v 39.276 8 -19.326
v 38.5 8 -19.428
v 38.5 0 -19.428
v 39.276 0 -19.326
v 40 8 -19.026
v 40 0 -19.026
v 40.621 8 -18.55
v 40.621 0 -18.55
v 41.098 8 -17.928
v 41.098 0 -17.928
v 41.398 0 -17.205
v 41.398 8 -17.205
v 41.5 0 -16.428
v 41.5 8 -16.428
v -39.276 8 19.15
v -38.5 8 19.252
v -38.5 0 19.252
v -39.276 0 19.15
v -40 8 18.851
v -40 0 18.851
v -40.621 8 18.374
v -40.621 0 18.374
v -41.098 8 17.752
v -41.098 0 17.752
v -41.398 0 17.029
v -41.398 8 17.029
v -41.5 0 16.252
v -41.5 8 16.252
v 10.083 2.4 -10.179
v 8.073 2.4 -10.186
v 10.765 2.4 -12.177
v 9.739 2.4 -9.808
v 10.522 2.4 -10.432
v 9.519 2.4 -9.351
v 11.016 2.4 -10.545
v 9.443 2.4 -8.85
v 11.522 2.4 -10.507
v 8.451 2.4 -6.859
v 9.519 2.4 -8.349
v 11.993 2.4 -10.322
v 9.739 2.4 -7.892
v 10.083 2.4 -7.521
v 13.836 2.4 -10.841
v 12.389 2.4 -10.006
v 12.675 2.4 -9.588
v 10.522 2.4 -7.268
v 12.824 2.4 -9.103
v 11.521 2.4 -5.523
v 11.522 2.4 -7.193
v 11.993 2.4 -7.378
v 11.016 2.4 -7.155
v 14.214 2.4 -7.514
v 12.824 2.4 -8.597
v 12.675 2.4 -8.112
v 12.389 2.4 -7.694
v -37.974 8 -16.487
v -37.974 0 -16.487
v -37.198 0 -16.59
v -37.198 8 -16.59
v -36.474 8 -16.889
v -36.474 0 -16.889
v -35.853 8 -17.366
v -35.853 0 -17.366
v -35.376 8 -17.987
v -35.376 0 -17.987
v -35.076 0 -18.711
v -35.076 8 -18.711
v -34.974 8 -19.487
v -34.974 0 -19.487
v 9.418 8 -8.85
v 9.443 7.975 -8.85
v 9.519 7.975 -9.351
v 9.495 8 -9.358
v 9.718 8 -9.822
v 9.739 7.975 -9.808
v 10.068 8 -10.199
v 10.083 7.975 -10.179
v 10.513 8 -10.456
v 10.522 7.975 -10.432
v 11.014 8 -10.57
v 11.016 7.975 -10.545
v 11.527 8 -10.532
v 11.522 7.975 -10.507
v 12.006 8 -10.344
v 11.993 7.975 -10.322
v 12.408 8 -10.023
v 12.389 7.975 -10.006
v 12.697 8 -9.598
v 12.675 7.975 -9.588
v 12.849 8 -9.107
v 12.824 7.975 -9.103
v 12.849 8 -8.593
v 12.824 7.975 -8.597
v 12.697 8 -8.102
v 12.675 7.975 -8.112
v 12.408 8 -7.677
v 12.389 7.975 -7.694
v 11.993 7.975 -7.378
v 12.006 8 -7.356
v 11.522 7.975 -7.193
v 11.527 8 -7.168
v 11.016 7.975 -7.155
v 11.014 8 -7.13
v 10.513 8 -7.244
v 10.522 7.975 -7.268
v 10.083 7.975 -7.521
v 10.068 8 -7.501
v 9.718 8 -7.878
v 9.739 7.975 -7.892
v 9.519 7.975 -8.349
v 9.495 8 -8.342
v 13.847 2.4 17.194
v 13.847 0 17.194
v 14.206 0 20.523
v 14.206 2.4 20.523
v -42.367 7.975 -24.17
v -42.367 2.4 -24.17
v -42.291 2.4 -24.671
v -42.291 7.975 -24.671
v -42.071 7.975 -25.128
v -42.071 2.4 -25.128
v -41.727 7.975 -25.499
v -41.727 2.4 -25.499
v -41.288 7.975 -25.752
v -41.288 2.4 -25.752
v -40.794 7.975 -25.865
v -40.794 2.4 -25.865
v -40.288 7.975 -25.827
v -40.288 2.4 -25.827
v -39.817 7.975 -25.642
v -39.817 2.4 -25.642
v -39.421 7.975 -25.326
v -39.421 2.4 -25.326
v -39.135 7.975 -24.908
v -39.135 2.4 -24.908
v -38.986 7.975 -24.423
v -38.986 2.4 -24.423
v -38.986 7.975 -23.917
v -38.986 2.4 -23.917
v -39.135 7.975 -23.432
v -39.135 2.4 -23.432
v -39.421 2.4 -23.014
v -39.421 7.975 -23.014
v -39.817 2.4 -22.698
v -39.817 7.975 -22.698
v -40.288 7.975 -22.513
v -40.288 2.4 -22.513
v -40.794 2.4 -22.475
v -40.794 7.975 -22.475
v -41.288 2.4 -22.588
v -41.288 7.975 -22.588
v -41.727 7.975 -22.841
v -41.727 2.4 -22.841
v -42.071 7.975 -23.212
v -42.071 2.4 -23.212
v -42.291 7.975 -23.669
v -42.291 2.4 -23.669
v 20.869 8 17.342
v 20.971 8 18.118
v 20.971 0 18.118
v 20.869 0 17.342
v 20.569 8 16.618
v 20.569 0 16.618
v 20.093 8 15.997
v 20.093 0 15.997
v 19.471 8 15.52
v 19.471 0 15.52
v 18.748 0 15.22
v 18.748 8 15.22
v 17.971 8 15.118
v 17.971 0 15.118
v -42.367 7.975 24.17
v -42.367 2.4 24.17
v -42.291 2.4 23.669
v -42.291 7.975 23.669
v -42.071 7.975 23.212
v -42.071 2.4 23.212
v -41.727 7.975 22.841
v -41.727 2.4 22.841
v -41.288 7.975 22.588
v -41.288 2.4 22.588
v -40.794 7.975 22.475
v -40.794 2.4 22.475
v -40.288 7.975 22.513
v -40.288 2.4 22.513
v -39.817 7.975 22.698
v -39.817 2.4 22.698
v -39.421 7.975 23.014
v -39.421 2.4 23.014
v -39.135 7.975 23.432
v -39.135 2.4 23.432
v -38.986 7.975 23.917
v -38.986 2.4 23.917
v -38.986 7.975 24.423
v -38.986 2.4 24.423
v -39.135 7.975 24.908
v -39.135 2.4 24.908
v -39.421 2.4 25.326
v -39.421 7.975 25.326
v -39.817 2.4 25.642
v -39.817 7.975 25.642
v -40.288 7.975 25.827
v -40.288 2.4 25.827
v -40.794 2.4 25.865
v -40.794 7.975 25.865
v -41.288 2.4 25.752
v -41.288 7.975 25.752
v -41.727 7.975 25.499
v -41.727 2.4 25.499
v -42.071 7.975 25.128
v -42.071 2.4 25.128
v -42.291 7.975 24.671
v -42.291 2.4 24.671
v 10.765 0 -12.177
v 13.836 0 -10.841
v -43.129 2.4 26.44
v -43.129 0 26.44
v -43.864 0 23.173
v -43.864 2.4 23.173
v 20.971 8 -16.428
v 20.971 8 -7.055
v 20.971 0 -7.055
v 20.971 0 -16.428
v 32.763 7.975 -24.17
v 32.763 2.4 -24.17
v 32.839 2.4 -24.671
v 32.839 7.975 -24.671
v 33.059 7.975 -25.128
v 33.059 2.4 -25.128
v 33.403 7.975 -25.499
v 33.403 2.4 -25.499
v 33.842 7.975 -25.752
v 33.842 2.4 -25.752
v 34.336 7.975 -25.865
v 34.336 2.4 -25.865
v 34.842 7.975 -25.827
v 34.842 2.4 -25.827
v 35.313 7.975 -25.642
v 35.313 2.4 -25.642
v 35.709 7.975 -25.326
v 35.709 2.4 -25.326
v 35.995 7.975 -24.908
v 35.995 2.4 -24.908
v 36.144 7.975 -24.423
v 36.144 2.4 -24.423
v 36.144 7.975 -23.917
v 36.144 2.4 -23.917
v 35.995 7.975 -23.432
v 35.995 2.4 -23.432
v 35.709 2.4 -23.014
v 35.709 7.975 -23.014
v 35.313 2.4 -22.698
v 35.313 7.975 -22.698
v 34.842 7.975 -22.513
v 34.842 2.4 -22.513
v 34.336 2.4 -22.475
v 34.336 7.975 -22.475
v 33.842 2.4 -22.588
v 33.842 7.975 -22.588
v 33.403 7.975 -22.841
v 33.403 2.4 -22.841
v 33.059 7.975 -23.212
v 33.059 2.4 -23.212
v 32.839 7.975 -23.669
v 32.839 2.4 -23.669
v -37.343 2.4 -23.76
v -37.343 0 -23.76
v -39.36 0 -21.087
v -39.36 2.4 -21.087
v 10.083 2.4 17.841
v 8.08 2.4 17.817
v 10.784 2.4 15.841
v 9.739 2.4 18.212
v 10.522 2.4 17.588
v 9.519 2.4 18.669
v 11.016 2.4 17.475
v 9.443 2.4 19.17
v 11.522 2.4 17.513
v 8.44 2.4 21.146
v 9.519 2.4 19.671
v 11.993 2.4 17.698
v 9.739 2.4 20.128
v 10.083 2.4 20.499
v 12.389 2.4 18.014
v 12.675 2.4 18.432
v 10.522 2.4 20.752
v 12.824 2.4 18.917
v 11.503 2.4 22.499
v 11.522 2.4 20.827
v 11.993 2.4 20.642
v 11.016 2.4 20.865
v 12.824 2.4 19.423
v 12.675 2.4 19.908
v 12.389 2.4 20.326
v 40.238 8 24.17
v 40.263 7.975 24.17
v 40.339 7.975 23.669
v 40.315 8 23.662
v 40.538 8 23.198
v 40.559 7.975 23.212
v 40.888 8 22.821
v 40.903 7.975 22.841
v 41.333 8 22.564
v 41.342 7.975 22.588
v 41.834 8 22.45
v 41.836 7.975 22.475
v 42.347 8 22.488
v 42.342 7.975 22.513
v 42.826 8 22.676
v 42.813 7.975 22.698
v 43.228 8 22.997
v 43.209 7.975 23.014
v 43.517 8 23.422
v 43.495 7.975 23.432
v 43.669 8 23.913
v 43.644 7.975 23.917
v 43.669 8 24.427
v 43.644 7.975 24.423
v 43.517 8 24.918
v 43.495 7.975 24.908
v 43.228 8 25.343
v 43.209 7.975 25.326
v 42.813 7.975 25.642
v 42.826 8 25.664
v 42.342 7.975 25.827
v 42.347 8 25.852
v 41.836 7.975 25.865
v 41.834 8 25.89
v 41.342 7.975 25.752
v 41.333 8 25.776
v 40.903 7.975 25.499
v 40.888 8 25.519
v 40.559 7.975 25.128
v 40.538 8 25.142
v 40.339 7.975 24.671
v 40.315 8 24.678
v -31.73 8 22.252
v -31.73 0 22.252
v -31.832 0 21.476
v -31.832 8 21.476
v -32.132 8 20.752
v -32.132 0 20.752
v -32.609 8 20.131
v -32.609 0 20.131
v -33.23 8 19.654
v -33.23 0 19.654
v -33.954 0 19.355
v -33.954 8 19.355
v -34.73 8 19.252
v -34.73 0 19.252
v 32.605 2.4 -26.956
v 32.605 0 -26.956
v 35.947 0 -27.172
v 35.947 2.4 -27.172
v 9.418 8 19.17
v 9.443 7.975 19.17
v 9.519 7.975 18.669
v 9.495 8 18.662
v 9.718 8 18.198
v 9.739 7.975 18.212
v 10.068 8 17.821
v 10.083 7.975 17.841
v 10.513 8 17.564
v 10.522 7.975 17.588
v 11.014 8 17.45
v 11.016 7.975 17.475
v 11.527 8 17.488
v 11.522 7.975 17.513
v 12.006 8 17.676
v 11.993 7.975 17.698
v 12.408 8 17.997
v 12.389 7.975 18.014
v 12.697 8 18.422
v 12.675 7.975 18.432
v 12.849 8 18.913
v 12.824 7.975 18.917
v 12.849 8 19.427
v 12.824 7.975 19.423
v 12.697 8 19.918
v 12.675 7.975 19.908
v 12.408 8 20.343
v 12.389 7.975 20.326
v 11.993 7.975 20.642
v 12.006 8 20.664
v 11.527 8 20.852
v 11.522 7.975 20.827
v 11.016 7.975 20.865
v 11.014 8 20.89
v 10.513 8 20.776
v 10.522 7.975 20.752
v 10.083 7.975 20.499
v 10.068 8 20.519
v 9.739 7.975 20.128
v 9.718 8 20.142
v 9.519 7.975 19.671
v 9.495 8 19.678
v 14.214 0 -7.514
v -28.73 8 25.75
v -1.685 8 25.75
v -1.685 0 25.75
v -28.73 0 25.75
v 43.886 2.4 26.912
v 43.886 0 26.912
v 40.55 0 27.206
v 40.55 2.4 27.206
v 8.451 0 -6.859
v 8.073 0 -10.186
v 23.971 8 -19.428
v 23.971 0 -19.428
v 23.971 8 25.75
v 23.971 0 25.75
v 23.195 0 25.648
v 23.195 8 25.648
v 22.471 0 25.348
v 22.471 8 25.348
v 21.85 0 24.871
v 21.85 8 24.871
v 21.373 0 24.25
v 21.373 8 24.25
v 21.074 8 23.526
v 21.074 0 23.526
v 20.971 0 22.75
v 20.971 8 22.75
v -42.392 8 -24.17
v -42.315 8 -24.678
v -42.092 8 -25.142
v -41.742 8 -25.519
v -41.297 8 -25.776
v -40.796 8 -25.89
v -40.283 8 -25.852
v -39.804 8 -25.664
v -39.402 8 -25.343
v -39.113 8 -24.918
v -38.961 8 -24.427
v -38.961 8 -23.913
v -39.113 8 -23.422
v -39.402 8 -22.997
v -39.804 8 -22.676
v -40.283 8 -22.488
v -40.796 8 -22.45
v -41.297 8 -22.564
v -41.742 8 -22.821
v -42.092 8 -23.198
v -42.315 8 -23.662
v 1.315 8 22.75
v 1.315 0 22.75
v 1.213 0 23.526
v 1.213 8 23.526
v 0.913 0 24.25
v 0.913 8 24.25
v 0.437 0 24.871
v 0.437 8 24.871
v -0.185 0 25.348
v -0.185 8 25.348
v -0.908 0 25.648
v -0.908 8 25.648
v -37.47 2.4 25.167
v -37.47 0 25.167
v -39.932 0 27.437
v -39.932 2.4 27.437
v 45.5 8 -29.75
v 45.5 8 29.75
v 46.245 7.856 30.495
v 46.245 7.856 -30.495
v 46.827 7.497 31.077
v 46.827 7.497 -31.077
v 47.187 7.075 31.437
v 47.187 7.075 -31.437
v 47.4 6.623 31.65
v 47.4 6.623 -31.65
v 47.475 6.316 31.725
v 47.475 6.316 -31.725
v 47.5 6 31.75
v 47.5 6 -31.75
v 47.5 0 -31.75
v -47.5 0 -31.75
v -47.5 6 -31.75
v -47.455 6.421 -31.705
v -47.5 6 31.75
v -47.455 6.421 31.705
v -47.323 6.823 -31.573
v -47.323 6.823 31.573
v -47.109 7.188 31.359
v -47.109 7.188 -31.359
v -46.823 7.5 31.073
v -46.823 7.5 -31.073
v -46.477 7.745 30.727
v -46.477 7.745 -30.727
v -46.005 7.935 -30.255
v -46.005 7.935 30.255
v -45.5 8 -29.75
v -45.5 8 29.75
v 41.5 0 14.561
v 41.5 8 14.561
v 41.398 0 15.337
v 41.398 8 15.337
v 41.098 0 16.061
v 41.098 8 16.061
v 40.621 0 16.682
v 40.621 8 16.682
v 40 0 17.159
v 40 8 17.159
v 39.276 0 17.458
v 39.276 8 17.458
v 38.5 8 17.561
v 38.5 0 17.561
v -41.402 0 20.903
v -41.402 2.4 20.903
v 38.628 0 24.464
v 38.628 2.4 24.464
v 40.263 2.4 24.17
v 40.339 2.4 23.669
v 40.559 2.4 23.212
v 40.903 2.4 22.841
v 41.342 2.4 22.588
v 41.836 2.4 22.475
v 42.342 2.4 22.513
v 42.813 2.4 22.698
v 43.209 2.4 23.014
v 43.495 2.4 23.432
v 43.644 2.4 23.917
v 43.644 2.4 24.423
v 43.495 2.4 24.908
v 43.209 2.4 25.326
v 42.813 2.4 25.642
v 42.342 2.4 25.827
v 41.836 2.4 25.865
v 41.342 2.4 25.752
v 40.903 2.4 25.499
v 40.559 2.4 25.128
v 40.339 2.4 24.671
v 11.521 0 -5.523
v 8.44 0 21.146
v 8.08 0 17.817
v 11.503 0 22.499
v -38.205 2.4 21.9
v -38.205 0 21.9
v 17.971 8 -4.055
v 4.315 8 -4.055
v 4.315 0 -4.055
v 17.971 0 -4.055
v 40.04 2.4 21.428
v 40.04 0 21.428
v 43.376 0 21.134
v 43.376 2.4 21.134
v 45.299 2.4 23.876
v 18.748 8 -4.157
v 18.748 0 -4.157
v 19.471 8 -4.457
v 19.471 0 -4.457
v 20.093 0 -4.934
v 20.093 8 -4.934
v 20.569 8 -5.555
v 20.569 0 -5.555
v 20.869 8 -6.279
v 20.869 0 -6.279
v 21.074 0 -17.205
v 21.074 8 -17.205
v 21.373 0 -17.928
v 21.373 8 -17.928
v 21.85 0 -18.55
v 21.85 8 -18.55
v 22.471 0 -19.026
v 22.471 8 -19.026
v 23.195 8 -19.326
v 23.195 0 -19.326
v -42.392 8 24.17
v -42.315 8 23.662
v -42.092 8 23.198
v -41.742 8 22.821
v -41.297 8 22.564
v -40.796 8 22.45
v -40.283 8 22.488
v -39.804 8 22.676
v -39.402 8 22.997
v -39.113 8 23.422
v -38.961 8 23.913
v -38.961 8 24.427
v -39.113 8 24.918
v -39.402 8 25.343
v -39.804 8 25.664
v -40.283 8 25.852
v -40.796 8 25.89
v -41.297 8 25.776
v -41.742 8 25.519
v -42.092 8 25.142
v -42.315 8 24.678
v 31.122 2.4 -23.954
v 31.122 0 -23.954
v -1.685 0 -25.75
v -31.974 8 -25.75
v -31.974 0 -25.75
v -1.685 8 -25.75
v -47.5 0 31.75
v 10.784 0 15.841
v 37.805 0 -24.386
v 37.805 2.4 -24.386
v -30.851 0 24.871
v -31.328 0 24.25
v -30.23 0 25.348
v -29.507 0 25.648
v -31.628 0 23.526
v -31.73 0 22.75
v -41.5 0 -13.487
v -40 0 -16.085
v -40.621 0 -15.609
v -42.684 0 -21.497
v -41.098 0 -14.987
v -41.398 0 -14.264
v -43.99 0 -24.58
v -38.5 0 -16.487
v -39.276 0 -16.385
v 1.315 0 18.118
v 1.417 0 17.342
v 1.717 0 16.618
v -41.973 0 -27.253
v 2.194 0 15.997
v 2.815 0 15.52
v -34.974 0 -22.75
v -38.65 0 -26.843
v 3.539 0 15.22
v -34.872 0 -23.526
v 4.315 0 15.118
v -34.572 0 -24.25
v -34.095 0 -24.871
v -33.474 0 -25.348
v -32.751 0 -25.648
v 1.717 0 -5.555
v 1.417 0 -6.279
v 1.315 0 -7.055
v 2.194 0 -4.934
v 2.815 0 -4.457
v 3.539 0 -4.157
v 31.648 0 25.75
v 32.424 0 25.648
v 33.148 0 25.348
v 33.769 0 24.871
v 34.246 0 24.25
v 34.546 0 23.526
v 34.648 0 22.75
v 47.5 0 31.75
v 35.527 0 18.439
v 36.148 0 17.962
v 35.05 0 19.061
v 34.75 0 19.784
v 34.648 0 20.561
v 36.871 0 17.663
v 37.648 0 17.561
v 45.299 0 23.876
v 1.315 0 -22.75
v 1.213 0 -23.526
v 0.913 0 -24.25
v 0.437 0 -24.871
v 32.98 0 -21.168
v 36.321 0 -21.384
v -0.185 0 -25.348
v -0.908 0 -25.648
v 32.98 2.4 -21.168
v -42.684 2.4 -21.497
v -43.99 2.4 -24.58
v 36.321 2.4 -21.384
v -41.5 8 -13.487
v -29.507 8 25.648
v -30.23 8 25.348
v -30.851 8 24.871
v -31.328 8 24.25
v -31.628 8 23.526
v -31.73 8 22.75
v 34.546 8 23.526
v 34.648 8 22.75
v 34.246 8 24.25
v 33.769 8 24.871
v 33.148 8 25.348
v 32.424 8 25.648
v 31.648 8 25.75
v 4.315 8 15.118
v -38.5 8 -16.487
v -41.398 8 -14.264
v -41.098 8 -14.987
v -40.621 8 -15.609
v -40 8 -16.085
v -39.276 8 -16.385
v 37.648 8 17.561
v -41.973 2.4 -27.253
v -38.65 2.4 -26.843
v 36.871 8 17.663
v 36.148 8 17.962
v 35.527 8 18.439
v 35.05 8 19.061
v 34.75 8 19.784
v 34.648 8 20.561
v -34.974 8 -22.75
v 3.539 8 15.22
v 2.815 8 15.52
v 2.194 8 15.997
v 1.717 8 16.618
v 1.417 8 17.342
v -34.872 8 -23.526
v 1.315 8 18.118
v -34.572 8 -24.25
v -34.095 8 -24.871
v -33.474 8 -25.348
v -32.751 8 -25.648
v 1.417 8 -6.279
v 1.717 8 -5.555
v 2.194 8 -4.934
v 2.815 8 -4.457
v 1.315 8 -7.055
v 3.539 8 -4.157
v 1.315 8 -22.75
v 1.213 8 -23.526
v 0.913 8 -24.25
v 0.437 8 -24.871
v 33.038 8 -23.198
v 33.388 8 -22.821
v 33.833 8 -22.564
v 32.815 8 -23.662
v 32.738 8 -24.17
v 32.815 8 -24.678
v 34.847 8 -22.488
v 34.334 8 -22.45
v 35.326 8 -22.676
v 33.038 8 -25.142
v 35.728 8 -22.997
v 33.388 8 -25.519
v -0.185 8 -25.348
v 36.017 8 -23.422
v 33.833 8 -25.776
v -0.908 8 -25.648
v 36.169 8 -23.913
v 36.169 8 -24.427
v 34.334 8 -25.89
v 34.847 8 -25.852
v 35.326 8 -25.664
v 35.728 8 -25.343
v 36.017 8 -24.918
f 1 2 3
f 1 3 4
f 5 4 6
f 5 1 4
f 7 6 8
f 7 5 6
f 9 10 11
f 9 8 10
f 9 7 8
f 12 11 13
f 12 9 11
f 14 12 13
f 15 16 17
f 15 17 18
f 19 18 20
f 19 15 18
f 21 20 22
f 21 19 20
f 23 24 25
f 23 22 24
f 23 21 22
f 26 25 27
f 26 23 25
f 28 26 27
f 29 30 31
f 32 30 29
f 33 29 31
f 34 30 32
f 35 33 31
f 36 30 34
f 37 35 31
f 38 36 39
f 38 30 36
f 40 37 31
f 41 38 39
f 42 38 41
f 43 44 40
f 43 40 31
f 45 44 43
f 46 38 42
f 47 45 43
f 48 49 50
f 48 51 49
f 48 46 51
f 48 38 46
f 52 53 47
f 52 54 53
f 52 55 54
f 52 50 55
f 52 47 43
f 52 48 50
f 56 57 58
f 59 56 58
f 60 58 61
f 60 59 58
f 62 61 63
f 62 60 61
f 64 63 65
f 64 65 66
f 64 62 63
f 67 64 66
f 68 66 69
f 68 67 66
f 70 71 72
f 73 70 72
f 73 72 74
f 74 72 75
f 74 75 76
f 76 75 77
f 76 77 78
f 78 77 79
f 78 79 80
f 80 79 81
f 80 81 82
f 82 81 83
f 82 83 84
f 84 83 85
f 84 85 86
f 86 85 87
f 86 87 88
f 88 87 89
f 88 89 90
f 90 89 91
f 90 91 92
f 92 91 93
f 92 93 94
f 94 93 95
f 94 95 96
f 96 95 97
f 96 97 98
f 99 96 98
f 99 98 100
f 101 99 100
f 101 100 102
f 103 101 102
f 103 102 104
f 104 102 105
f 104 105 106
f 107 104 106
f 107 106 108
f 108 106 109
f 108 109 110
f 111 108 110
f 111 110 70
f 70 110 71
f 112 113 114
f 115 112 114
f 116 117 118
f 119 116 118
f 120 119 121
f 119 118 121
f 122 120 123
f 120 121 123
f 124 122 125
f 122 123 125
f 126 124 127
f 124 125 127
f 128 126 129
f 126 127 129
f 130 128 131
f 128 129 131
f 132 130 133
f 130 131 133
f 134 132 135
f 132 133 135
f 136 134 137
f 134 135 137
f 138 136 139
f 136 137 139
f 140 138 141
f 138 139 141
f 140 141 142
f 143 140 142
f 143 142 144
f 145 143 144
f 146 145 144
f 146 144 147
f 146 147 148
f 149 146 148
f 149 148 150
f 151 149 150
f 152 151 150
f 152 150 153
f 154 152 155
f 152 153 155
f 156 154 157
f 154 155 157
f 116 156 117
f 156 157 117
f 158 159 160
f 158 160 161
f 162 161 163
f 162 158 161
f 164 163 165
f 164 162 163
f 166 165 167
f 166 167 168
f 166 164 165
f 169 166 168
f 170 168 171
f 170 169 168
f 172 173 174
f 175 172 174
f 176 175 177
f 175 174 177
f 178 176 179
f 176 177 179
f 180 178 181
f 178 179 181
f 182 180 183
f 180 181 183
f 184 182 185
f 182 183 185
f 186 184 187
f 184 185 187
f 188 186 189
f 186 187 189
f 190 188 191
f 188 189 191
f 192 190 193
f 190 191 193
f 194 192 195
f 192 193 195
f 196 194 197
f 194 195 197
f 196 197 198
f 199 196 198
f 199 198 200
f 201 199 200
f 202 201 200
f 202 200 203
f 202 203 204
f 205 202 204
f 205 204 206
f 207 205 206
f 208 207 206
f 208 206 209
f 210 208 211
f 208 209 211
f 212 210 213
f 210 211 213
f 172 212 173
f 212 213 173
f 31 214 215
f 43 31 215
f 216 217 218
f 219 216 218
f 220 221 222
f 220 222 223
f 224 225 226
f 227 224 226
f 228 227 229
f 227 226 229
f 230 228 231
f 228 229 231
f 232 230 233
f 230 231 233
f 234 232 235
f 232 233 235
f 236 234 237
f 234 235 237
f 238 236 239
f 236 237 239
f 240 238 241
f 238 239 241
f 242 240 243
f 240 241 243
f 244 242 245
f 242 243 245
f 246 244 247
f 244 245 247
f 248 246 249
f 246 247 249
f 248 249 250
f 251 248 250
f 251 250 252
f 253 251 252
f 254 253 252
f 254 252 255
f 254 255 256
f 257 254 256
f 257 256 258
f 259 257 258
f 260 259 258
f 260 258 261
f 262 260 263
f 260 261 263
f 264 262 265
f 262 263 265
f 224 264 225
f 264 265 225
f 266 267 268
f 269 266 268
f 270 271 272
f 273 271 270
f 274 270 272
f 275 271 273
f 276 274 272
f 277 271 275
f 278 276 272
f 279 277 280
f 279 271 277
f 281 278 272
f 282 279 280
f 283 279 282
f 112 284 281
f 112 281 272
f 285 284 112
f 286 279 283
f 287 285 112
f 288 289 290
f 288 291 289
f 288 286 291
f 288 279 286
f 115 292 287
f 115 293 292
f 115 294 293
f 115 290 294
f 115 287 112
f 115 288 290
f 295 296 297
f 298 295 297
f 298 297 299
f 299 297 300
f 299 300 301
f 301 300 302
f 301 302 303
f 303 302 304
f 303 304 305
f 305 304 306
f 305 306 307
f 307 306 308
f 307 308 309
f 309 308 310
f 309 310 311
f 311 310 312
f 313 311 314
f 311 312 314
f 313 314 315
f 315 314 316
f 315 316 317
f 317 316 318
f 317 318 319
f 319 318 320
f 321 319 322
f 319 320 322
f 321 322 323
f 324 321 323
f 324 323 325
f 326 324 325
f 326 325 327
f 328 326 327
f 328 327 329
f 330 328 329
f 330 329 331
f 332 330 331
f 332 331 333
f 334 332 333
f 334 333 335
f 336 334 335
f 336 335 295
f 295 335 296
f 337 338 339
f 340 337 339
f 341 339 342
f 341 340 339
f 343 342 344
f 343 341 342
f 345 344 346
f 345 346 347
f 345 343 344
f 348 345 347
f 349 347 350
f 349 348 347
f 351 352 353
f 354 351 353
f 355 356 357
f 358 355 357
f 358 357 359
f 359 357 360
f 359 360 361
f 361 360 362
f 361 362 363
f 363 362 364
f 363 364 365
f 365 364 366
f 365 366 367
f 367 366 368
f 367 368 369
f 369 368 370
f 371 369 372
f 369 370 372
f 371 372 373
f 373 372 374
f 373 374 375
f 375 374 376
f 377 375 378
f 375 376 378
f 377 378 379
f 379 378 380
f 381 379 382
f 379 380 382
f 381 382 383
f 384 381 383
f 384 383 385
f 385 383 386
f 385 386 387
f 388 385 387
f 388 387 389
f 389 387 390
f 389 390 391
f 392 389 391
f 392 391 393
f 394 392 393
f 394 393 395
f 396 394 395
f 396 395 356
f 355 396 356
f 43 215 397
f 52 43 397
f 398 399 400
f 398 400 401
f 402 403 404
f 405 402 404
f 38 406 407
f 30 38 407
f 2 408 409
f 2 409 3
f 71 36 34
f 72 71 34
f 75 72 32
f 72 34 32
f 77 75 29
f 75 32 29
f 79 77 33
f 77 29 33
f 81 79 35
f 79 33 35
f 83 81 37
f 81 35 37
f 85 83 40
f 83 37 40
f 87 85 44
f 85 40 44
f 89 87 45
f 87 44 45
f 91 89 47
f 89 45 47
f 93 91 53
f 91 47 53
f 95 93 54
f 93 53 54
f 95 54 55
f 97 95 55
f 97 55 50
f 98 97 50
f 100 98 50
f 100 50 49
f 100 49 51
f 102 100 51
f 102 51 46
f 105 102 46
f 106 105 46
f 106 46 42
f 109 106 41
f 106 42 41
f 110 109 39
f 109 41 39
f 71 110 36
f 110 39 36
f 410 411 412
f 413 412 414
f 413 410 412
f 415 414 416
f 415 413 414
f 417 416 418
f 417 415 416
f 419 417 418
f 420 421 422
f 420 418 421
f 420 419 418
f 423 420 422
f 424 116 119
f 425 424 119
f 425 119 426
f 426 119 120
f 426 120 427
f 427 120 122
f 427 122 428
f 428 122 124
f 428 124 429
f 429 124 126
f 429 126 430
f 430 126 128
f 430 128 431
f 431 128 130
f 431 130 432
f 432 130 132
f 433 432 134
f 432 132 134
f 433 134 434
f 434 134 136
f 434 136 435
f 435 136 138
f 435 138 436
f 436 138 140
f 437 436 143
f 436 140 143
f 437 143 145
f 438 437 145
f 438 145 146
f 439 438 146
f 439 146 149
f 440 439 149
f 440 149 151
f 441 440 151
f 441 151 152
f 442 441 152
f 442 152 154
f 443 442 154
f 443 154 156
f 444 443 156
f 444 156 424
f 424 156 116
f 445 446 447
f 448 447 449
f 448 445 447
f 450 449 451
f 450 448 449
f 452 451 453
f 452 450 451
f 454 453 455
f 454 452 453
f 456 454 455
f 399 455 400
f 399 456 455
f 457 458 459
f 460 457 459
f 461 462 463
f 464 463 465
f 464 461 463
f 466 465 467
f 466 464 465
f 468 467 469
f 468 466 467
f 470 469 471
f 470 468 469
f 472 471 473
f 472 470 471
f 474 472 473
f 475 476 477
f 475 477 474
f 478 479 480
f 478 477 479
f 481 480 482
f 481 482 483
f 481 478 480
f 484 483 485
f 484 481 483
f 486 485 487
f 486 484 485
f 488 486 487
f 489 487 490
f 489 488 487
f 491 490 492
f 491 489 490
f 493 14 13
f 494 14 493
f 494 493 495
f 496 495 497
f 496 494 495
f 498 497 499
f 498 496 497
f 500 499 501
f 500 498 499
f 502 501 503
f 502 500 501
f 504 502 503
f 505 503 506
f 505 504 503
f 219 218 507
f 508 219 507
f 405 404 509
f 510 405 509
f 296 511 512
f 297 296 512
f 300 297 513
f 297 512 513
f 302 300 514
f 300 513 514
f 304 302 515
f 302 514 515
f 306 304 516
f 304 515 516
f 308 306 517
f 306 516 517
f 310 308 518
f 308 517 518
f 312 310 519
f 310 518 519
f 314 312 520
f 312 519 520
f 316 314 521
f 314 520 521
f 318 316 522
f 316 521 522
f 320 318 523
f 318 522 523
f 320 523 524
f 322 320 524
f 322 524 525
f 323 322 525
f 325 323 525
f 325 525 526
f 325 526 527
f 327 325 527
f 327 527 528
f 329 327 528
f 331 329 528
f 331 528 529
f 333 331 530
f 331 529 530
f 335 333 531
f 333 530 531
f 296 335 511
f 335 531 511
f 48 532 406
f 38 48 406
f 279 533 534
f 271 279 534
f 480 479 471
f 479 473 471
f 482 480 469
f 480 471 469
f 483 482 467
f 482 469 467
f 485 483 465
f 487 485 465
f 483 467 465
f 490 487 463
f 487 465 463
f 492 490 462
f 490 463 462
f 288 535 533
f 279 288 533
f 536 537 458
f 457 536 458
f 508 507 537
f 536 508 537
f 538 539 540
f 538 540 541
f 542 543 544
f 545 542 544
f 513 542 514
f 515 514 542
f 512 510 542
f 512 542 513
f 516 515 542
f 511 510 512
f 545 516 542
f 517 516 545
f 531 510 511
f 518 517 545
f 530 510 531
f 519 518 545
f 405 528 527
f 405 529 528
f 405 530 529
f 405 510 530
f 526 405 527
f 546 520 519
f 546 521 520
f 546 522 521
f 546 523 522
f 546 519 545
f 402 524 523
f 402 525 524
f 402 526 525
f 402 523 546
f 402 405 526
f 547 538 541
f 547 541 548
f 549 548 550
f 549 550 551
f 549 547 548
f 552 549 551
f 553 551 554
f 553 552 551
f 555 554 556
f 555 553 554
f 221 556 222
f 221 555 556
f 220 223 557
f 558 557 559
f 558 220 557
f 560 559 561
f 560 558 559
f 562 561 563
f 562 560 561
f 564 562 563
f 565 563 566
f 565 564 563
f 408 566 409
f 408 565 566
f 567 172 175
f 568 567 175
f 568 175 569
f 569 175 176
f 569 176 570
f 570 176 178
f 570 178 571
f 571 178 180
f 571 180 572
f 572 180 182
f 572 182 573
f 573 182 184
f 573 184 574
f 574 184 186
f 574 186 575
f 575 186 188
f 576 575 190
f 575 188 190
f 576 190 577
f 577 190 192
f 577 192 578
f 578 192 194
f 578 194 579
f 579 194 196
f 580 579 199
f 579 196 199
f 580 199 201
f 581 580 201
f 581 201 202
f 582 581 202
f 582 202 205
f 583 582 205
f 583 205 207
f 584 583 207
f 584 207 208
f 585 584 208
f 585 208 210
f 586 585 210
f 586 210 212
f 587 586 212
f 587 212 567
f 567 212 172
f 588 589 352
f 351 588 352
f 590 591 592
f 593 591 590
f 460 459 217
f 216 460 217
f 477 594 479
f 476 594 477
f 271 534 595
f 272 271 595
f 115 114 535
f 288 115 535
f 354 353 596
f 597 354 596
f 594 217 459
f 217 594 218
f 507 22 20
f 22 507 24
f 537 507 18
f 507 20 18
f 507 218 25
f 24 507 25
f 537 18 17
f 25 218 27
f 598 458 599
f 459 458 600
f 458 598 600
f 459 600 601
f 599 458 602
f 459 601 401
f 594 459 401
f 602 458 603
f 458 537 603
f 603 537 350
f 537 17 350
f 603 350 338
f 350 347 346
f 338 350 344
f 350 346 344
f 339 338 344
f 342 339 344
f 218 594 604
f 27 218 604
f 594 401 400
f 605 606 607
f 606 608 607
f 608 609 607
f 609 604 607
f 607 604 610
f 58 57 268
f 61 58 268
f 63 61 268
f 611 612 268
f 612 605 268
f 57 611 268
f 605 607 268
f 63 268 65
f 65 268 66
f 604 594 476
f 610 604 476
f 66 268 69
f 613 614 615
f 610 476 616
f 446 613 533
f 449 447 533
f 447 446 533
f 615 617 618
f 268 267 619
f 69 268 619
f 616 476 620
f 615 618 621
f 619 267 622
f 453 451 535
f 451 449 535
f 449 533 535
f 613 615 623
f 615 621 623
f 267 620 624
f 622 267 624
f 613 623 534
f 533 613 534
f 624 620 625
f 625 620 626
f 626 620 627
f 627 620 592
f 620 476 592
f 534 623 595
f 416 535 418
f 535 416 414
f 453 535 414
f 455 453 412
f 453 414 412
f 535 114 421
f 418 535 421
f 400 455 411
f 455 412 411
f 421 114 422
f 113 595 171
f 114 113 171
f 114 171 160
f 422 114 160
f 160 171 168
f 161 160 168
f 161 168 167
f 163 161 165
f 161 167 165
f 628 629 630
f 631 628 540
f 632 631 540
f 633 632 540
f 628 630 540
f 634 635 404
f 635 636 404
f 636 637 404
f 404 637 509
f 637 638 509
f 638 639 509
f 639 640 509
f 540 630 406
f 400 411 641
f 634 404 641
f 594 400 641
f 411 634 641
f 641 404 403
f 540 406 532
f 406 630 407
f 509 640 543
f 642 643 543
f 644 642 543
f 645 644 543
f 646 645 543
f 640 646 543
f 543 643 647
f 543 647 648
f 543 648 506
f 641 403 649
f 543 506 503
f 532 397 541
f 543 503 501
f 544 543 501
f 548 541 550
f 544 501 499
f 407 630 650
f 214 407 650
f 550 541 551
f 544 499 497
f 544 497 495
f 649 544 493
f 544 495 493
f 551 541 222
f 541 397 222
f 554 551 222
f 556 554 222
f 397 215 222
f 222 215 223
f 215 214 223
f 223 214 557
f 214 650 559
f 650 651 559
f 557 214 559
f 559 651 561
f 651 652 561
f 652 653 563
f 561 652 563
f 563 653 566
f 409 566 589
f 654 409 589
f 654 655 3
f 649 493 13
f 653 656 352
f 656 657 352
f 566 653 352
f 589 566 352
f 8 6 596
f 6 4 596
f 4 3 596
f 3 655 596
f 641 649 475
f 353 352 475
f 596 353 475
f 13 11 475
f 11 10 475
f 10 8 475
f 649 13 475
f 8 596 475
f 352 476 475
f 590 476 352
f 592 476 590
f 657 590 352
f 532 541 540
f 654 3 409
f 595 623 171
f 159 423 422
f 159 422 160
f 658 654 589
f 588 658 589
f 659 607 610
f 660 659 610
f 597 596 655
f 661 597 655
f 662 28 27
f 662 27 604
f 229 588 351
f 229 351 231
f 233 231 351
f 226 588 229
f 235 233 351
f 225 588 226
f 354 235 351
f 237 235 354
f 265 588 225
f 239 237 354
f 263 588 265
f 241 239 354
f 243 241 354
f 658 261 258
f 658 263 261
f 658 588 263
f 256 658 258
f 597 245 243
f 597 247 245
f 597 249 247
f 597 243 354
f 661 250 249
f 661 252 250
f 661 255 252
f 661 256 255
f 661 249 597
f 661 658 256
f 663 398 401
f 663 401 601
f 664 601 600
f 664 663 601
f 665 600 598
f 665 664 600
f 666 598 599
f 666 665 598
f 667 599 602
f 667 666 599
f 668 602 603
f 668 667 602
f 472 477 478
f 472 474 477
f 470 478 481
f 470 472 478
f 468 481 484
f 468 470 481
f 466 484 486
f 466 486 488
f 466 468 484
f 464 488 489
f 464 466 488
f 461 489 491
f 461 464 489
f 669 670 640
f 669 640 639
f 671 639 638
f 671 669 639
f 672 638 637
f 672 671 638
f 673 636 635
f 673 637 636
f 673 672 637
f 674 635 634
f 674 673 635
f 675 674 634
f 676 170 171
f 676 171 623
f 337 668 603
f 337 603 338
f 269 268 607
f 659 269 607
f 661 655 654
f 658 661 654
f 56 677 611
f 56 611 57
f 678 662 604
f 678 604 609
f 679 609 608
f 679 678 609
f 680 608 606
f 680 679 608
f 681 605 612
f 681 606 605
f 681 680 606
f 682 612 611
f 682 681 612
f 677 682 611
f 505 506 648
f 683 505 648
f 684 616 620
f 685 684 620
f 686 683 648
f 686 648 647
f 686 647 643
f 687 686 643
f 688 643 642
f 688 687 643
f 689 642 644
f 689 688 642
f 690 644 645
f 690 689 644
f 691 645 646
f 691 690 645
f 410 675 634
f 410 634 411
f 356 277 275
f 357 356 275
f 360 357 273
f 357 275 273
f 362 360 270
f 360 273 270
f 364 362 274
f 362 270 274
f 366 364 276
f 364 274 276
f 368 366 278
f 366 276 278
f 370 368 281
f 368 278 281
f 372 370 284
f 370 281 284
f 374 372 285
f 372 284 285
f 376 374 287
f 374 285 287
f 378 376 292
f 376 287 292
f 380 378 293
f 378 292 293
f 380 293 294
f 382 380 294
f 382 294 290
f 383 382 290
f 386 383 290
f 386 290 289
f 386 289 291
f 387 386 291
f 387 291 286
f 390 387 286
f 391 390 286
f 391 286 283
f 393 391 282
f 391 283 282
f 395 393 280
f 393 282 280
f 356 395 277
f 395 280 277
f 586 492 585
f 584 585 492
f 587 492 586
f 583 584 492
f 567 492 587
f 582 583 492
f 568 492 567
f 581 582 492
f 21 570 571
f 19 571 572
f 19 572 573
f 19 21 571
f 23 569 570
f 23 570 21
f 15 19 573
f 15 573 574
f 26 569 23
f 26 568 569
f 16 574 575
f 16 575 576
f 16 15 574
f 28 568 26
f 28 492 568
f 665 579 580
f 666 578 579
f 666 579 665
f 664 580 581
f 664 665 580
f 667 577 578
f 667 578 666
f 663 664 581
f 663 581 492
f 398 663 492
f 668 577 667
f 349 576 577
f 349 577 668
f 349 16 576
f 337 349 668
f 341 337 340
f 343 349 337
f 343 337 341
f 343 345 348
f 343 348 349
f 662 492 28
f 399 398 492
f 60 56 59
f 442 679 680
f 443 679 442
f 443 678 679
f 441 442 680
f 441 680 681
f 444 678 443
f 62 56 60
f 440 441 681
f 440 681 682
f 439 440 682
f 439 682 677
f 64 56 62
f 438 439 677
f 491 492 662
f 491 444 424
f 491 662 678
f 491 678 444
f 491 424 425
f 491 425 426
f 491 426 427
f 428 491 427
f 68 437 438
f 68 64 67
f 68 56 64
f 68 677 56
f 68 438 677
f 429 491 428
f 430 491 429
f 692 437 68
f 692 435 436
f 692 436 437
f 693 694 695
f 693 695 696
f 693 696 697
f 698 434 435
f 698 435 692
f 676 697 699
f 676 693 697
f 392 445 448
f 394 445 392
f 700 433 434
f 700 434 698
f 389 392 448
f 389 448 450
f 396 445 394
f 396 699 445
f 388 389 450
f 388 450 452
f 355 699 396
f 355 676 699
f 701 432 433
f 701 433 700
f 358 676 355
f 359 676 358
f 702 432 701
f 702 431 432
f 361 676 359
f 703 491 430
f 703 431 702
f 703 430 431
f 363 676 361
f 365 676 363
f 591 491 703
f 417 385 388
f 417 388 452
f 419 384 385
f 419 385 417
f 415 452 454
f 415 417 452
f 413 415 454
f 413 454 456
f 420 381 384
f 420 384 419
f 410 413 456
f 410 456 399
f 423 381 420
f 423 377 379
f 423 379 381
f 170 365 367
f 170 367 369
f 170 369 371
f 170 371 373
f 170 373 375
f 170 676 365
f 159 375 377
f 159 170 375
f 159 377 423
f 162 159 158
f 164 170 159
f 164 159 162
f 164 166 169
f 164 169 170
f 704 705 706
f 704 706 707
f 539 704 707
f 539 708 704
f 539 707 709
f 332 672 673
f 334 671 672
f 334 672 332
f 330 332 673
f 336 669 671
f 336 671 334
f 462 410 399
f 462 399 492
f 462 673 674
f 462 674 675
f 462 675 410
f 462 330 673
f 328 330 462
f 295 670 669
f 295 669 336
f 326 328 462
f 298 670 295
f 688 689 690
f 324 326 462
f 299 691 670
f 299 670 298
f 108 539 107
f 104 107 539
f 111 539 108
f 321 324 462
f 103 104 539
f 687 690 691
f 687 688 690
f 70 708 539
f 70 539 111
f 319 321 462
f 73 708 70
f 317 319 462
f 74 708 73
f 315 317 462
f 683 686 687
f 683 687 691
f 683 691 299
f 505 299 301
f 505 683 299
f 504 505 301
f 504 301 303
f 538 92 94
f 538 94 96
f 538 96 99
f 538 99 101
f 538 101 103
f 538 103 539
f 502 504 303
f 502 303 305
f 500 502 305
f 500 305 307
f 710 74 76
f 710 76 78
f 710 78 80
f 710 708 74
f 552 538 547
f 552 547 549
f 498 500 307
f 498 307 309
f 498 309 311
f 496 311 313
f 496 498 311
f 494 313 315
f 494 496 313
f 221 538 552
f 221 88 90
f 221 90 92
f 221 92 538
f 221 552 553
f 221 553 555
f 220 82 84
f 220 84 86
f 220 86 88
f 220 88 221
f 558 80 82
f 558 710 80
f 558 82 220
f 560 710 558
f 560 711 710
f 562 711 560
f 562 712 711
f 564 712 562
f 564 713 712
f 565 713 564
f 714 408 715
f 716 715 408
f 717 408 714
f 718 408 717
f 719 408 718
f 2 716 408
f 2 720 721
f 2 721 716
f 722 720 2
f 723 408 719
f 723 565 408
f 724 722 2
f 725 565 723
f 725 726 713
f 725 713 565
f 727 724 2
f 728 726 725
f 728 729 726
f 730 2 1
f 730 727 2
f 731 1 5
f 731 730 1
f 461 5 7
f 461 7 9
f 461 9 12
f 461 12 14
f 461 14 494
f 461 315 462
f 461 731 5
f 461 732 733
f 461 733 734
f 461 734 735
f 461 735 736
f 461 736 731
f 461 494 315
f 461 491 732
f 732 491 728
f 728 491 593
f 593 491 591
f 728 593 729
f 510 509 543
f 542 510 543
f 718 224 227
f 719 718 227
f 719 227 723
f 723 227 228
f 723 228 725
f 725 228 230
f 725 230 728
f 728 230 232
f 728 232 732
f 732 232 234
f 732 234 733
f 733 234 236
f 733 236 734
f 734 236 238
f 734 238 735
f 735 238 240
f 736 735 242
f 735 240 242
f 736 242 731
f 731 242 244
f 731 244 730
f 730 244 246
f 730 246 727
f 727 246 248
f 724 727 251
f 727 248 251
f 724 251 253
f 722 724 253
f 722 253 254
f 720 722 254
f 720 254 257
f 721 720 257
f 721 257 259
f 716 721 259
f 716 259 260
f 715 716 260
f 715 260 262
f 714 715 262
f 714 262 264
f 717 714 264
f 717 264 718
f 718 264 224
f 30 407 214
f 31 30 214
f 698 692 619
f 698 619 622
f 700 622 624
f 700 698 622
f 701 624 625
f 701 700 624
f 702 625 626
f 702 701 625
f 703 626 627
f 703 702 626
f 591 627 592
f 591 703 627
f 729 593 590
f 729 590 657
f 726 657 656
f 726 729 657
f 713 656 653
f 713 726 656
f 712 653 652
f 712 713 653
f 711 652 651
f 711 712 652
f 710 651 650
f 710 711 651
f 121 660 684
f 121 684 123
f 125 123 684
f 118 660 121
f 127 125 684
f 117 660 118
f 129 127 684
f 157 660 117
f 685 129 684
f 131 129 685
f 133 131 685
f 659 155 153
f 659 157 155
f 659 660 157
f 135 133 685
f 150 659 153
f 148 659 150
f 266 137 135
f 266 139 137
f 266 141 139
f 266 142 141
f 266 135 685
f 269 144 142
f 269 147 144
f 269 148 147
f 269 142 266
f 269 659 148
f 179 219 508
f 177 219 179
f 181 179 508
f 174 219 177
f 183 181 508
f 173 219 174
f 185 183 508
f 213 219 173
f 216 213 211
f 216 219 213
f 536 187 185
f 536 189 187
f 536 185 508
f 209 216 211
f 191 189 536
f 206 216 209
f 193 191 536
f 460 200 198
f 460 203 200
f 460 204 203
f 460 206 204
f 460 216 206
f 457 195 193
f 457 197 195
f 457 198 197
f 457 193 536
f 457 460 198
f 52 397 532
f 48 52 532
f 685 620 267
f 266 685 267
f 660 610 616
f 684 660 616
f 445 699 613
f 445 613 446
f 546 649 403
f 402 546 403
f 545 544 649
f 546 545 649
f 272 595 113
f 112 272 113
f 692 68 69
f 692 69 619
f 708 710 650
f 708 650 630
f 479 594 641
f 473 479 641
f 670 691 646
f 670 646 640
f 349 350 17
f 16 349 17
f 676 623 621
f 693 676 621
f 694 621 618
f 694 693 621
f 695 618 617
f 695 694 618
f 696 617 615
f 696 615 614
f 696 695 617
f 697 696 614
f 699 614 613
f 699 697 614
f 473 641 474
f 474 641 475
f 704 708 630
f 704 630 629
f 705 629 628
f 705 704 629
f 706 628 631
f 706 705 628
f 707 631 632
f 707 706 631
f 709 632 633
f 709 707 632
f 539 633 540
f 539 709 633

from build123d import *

# Parameters (mm, degrees)
SKETCH2_W                      = 95
SKETCH2_H                      = 63.5
BOSS_EXTRUDE1_DEPTH            = 8
M3_CLEARANCE_HOLE1_D           = 3.4
M3_CLEARANCE_HOLE1_CSINK_D     = 3.45
M3_CLEARANCE_HOLE1_CSINK_ANGLE = 90
CUT_EXTRUDE1_DEPTH             = 10
CUT_EXTRUDE2_DEPTH             = 2.4
FILLET2_R                      = 2


with BuildPart() as part:
    # Sketch2 → Boss-Extrude1 (new body)
    with BuildSketch(Plane(origin=(0, 0, 0), x_dir=(1, 0, 0), z_dir=(0, 1, 0))):
        Rectangle(SKETCH2_W, SKETCH2_H)
    extrude(amount=BOSS_EXTRUDE1_DEPTH)

    # M3 Clearance Hole1 (through all)
    with Locations(Plane(origin=(0, 8, 0), x_dir=(1, 0, 0), z_dir=(0, 1, 0))):
        with Locations((-40.666732268, 24.17), (-40.666732268, -24.17), (34.463267732, 24.17), (41.963267732, -24.17), (11.143267732, -19.17), (11.143267732, 8.85)):
            CounterSinkHole(M3_CLEARANCE_HOLE1_D / 2, M3_CLEARANCE_HOLE1_CSINK_D / 2, counter_sink_angle=M3_CLEARANCE_HOLE1_CSINK_ANGLE)

    # Sketch9 → Cut-Extrude1 (cut)
    with BuildSketch(Plane(origin=(0, 8, 0), x_dir=(1, 0, 0), z_dir=(0, 1, 0))):
        with BuildLine():
            Line((-34.974163292, 19.487383717), (-34.974163292, 22.75))
            ThreePointArc((-34.974163292, 22.75), (-34.095483636, 24.871320344), (-31.974163292, 25.75))
            Line((-31.974163292, 25.75), (-1.684765082, 25.75))
            ThreePointArc((-1.684765082, 25.75), (0.436555262, 24.871320344), (1.315234918, 22.75))
            Line((1.315234918, 22.75), (1.315234918, 7.055031971))
            ThreePointArc((1.315234918, 7.055031971), (2.193914574, 4.933711628), (4.315234918, 4.055031971))
            Line((4.315234918, 4.055031971), (17.971300546, 4.055031971))
            ThreePointArc((17.971300546, 4.055031971), (20.09262089, 4.933711628), (20.971300546, 7.055031971))
            Line((20.971300546, 7.055031971), (20.971300546, 16.428287462))
            ThreePointArc((20.971300546, 16.428287462), (21.849980203, 18.549607805), (23.971300546, 19.428287462))
            Line((23.971300546, 19.428287462), (38.5, 19.428287462))
            ThreePointArc((38.5, 19.428287462), (40.621320344, 18.549607805), (41.5, 16.428287462))
            Line((41.5, 16.428287462), (41.5, -14.560508757))
            ThreePointArc((41.5, -14.560508757), (40.621320344, -16.681829101), (38.5, -17.560508757))
            Line((38.5, -17.560508757), (37.647901029, -17.560508757))
            ThreePointArc((37.647901029, -17.560508757), (35.526580685, -18.439188414), (34.647901029, -20.560508757))
            Line((34.647901029, -20.560508757), (34.647901029, -22.75))
            ThreePointArc((34.647901029, -22.75), (33.769221372, -24.871320344), (31.647901029, -25.75))
            Line((31.647901029, -25.75), (23.971300546, -25.75))
            ThreePointArc((23.971300546, -25.75), (21.849980203, -24.871320344), (20.971300546, -22.75))
            Line((20.971300546, -22.75), (20.971300546, -18.118028913))
            ThreePointArc((20.971300546, -18.118028913), (20.09262089, -15.996708569), (17.971300546, -15.118028913))
            Line((17.971300546, -15.118028913), (4.315234918, -15.118028913))
            ThreePointArc((4.315234918, -15.118028913), (2.193914574, -15.996708569), (1.315234918, -18.118028913))
            Line((1.315234918, -18.118028913), (1.315234918, -22.75))
            ThreePointArc((1.315234918, -22.75), (0.436555262, -24.871320344), (-1.684765082, -25.75))
            Line((-1.684765082, -25.75), (-28.730080623, -25.75))
            ThreePointArc((-28.730080623, -25.75), (-30.851400966, -24.871320344), (-31.730080623, -22.75))
            Line((-31.730080623, -22.75), (-31.730080623, -22.252488185))
            ThreePointArc((-31.730080623, -22.252488185), (-32.608760279, -20.131167841), (-34.730080623, -19.252488185))
            Line((-34.730080623, -19.252488185), (-38.5, -19.252488185))
            ThreePointArc((-38.5, -19.252488185), (-40.621320344, -18.373808528), (-41.5, -16.252488185))
            Line((-41.5, -16.252488185), (-41.5, 13.487383717))
            ThreePointArc((-41.5, 13.487383717), (-40.621320344, 15.60870406), (-38.5, 16.487383717))
            Line((-38.5, 16.487383717), (-37.974163292, 16.487383717))
            ThreePointArc((-37.974163292, 16.487383717), (-35.852842949, 17.366063373), (-34.974163292, 19.487383717))
        make_face()
    extrude(amount=-CUT_EXTRUDE1_DEPTH, mode=Mode.SUBTRACT)

    # Sketch10 → Cut-Extrude2 (cut)
    with BuildSketch(Plane.XZ):
        Polygon((-41.401711603, 20.903023001), (-38.204936861, 21.900000725), (-37.469957526, 25.166977724), (-39.931752933, 27.436976999), (-43.128527675, 26.439999275), (-43.86350701, 23.173022276), align=None)
        Polygon((-41.973397742, -27.253173474), (-38.649958452, -26.843192232), (-37.343292978, -23.760018758), (-39.360066794, -21.086826526), (-42.683506084, -21.496807768), (-43.990171558, -24.579981242), align=None)
        Polygon((8.072719548, -10.186064064), (10.765059061, -12.177204763), (13.835607245, -10.841140699), (14.213815916, -7.513935936), (11.521476403, -5.522795237), (8.450928219, -6.858859301), align=None)
        Polygon((8.080180086, 17.816919291), (10.783526176, 15.84074793), (13.846613823, 17.193828639), (14.206355378, 20.523080709), (11.503009288, 22.49925207), (8.439921642, 21.146171361), align=None)
        Polygon((32.605291512, -26.95590339), (35.94694273, -27.172006301), (37.804918951, -24.386102911), (36.321243952, -21.38409661), (32.979592734, -21.167993699), (31.121616514, -23.953897089), align=None)
        Polygon((40.040474323, 21.428431318), (43.376139153, 21.13402772), (45.298932562, 23.875596402), (43.886061141, 26.911568682), (40.550396312, 27.20597228), (38.627602903, 24.464403598), align=None)
    extrude(amount=-CUT_EXTRUDE2_DEPTH, mode=Mode.SUBTRACT)

    # Fillet2
    fillet2_edges = [part.edges().sort_by_distance(p)[0] for p in [
        (47.5, 8, 0),
        (0, 8, -31.75),
        (-47.5, 8, 0),
        (0, 8, 31.75),
    ]]
    fillet(fillet2_edges, radius=FILLET2_R)


solid = part.part
